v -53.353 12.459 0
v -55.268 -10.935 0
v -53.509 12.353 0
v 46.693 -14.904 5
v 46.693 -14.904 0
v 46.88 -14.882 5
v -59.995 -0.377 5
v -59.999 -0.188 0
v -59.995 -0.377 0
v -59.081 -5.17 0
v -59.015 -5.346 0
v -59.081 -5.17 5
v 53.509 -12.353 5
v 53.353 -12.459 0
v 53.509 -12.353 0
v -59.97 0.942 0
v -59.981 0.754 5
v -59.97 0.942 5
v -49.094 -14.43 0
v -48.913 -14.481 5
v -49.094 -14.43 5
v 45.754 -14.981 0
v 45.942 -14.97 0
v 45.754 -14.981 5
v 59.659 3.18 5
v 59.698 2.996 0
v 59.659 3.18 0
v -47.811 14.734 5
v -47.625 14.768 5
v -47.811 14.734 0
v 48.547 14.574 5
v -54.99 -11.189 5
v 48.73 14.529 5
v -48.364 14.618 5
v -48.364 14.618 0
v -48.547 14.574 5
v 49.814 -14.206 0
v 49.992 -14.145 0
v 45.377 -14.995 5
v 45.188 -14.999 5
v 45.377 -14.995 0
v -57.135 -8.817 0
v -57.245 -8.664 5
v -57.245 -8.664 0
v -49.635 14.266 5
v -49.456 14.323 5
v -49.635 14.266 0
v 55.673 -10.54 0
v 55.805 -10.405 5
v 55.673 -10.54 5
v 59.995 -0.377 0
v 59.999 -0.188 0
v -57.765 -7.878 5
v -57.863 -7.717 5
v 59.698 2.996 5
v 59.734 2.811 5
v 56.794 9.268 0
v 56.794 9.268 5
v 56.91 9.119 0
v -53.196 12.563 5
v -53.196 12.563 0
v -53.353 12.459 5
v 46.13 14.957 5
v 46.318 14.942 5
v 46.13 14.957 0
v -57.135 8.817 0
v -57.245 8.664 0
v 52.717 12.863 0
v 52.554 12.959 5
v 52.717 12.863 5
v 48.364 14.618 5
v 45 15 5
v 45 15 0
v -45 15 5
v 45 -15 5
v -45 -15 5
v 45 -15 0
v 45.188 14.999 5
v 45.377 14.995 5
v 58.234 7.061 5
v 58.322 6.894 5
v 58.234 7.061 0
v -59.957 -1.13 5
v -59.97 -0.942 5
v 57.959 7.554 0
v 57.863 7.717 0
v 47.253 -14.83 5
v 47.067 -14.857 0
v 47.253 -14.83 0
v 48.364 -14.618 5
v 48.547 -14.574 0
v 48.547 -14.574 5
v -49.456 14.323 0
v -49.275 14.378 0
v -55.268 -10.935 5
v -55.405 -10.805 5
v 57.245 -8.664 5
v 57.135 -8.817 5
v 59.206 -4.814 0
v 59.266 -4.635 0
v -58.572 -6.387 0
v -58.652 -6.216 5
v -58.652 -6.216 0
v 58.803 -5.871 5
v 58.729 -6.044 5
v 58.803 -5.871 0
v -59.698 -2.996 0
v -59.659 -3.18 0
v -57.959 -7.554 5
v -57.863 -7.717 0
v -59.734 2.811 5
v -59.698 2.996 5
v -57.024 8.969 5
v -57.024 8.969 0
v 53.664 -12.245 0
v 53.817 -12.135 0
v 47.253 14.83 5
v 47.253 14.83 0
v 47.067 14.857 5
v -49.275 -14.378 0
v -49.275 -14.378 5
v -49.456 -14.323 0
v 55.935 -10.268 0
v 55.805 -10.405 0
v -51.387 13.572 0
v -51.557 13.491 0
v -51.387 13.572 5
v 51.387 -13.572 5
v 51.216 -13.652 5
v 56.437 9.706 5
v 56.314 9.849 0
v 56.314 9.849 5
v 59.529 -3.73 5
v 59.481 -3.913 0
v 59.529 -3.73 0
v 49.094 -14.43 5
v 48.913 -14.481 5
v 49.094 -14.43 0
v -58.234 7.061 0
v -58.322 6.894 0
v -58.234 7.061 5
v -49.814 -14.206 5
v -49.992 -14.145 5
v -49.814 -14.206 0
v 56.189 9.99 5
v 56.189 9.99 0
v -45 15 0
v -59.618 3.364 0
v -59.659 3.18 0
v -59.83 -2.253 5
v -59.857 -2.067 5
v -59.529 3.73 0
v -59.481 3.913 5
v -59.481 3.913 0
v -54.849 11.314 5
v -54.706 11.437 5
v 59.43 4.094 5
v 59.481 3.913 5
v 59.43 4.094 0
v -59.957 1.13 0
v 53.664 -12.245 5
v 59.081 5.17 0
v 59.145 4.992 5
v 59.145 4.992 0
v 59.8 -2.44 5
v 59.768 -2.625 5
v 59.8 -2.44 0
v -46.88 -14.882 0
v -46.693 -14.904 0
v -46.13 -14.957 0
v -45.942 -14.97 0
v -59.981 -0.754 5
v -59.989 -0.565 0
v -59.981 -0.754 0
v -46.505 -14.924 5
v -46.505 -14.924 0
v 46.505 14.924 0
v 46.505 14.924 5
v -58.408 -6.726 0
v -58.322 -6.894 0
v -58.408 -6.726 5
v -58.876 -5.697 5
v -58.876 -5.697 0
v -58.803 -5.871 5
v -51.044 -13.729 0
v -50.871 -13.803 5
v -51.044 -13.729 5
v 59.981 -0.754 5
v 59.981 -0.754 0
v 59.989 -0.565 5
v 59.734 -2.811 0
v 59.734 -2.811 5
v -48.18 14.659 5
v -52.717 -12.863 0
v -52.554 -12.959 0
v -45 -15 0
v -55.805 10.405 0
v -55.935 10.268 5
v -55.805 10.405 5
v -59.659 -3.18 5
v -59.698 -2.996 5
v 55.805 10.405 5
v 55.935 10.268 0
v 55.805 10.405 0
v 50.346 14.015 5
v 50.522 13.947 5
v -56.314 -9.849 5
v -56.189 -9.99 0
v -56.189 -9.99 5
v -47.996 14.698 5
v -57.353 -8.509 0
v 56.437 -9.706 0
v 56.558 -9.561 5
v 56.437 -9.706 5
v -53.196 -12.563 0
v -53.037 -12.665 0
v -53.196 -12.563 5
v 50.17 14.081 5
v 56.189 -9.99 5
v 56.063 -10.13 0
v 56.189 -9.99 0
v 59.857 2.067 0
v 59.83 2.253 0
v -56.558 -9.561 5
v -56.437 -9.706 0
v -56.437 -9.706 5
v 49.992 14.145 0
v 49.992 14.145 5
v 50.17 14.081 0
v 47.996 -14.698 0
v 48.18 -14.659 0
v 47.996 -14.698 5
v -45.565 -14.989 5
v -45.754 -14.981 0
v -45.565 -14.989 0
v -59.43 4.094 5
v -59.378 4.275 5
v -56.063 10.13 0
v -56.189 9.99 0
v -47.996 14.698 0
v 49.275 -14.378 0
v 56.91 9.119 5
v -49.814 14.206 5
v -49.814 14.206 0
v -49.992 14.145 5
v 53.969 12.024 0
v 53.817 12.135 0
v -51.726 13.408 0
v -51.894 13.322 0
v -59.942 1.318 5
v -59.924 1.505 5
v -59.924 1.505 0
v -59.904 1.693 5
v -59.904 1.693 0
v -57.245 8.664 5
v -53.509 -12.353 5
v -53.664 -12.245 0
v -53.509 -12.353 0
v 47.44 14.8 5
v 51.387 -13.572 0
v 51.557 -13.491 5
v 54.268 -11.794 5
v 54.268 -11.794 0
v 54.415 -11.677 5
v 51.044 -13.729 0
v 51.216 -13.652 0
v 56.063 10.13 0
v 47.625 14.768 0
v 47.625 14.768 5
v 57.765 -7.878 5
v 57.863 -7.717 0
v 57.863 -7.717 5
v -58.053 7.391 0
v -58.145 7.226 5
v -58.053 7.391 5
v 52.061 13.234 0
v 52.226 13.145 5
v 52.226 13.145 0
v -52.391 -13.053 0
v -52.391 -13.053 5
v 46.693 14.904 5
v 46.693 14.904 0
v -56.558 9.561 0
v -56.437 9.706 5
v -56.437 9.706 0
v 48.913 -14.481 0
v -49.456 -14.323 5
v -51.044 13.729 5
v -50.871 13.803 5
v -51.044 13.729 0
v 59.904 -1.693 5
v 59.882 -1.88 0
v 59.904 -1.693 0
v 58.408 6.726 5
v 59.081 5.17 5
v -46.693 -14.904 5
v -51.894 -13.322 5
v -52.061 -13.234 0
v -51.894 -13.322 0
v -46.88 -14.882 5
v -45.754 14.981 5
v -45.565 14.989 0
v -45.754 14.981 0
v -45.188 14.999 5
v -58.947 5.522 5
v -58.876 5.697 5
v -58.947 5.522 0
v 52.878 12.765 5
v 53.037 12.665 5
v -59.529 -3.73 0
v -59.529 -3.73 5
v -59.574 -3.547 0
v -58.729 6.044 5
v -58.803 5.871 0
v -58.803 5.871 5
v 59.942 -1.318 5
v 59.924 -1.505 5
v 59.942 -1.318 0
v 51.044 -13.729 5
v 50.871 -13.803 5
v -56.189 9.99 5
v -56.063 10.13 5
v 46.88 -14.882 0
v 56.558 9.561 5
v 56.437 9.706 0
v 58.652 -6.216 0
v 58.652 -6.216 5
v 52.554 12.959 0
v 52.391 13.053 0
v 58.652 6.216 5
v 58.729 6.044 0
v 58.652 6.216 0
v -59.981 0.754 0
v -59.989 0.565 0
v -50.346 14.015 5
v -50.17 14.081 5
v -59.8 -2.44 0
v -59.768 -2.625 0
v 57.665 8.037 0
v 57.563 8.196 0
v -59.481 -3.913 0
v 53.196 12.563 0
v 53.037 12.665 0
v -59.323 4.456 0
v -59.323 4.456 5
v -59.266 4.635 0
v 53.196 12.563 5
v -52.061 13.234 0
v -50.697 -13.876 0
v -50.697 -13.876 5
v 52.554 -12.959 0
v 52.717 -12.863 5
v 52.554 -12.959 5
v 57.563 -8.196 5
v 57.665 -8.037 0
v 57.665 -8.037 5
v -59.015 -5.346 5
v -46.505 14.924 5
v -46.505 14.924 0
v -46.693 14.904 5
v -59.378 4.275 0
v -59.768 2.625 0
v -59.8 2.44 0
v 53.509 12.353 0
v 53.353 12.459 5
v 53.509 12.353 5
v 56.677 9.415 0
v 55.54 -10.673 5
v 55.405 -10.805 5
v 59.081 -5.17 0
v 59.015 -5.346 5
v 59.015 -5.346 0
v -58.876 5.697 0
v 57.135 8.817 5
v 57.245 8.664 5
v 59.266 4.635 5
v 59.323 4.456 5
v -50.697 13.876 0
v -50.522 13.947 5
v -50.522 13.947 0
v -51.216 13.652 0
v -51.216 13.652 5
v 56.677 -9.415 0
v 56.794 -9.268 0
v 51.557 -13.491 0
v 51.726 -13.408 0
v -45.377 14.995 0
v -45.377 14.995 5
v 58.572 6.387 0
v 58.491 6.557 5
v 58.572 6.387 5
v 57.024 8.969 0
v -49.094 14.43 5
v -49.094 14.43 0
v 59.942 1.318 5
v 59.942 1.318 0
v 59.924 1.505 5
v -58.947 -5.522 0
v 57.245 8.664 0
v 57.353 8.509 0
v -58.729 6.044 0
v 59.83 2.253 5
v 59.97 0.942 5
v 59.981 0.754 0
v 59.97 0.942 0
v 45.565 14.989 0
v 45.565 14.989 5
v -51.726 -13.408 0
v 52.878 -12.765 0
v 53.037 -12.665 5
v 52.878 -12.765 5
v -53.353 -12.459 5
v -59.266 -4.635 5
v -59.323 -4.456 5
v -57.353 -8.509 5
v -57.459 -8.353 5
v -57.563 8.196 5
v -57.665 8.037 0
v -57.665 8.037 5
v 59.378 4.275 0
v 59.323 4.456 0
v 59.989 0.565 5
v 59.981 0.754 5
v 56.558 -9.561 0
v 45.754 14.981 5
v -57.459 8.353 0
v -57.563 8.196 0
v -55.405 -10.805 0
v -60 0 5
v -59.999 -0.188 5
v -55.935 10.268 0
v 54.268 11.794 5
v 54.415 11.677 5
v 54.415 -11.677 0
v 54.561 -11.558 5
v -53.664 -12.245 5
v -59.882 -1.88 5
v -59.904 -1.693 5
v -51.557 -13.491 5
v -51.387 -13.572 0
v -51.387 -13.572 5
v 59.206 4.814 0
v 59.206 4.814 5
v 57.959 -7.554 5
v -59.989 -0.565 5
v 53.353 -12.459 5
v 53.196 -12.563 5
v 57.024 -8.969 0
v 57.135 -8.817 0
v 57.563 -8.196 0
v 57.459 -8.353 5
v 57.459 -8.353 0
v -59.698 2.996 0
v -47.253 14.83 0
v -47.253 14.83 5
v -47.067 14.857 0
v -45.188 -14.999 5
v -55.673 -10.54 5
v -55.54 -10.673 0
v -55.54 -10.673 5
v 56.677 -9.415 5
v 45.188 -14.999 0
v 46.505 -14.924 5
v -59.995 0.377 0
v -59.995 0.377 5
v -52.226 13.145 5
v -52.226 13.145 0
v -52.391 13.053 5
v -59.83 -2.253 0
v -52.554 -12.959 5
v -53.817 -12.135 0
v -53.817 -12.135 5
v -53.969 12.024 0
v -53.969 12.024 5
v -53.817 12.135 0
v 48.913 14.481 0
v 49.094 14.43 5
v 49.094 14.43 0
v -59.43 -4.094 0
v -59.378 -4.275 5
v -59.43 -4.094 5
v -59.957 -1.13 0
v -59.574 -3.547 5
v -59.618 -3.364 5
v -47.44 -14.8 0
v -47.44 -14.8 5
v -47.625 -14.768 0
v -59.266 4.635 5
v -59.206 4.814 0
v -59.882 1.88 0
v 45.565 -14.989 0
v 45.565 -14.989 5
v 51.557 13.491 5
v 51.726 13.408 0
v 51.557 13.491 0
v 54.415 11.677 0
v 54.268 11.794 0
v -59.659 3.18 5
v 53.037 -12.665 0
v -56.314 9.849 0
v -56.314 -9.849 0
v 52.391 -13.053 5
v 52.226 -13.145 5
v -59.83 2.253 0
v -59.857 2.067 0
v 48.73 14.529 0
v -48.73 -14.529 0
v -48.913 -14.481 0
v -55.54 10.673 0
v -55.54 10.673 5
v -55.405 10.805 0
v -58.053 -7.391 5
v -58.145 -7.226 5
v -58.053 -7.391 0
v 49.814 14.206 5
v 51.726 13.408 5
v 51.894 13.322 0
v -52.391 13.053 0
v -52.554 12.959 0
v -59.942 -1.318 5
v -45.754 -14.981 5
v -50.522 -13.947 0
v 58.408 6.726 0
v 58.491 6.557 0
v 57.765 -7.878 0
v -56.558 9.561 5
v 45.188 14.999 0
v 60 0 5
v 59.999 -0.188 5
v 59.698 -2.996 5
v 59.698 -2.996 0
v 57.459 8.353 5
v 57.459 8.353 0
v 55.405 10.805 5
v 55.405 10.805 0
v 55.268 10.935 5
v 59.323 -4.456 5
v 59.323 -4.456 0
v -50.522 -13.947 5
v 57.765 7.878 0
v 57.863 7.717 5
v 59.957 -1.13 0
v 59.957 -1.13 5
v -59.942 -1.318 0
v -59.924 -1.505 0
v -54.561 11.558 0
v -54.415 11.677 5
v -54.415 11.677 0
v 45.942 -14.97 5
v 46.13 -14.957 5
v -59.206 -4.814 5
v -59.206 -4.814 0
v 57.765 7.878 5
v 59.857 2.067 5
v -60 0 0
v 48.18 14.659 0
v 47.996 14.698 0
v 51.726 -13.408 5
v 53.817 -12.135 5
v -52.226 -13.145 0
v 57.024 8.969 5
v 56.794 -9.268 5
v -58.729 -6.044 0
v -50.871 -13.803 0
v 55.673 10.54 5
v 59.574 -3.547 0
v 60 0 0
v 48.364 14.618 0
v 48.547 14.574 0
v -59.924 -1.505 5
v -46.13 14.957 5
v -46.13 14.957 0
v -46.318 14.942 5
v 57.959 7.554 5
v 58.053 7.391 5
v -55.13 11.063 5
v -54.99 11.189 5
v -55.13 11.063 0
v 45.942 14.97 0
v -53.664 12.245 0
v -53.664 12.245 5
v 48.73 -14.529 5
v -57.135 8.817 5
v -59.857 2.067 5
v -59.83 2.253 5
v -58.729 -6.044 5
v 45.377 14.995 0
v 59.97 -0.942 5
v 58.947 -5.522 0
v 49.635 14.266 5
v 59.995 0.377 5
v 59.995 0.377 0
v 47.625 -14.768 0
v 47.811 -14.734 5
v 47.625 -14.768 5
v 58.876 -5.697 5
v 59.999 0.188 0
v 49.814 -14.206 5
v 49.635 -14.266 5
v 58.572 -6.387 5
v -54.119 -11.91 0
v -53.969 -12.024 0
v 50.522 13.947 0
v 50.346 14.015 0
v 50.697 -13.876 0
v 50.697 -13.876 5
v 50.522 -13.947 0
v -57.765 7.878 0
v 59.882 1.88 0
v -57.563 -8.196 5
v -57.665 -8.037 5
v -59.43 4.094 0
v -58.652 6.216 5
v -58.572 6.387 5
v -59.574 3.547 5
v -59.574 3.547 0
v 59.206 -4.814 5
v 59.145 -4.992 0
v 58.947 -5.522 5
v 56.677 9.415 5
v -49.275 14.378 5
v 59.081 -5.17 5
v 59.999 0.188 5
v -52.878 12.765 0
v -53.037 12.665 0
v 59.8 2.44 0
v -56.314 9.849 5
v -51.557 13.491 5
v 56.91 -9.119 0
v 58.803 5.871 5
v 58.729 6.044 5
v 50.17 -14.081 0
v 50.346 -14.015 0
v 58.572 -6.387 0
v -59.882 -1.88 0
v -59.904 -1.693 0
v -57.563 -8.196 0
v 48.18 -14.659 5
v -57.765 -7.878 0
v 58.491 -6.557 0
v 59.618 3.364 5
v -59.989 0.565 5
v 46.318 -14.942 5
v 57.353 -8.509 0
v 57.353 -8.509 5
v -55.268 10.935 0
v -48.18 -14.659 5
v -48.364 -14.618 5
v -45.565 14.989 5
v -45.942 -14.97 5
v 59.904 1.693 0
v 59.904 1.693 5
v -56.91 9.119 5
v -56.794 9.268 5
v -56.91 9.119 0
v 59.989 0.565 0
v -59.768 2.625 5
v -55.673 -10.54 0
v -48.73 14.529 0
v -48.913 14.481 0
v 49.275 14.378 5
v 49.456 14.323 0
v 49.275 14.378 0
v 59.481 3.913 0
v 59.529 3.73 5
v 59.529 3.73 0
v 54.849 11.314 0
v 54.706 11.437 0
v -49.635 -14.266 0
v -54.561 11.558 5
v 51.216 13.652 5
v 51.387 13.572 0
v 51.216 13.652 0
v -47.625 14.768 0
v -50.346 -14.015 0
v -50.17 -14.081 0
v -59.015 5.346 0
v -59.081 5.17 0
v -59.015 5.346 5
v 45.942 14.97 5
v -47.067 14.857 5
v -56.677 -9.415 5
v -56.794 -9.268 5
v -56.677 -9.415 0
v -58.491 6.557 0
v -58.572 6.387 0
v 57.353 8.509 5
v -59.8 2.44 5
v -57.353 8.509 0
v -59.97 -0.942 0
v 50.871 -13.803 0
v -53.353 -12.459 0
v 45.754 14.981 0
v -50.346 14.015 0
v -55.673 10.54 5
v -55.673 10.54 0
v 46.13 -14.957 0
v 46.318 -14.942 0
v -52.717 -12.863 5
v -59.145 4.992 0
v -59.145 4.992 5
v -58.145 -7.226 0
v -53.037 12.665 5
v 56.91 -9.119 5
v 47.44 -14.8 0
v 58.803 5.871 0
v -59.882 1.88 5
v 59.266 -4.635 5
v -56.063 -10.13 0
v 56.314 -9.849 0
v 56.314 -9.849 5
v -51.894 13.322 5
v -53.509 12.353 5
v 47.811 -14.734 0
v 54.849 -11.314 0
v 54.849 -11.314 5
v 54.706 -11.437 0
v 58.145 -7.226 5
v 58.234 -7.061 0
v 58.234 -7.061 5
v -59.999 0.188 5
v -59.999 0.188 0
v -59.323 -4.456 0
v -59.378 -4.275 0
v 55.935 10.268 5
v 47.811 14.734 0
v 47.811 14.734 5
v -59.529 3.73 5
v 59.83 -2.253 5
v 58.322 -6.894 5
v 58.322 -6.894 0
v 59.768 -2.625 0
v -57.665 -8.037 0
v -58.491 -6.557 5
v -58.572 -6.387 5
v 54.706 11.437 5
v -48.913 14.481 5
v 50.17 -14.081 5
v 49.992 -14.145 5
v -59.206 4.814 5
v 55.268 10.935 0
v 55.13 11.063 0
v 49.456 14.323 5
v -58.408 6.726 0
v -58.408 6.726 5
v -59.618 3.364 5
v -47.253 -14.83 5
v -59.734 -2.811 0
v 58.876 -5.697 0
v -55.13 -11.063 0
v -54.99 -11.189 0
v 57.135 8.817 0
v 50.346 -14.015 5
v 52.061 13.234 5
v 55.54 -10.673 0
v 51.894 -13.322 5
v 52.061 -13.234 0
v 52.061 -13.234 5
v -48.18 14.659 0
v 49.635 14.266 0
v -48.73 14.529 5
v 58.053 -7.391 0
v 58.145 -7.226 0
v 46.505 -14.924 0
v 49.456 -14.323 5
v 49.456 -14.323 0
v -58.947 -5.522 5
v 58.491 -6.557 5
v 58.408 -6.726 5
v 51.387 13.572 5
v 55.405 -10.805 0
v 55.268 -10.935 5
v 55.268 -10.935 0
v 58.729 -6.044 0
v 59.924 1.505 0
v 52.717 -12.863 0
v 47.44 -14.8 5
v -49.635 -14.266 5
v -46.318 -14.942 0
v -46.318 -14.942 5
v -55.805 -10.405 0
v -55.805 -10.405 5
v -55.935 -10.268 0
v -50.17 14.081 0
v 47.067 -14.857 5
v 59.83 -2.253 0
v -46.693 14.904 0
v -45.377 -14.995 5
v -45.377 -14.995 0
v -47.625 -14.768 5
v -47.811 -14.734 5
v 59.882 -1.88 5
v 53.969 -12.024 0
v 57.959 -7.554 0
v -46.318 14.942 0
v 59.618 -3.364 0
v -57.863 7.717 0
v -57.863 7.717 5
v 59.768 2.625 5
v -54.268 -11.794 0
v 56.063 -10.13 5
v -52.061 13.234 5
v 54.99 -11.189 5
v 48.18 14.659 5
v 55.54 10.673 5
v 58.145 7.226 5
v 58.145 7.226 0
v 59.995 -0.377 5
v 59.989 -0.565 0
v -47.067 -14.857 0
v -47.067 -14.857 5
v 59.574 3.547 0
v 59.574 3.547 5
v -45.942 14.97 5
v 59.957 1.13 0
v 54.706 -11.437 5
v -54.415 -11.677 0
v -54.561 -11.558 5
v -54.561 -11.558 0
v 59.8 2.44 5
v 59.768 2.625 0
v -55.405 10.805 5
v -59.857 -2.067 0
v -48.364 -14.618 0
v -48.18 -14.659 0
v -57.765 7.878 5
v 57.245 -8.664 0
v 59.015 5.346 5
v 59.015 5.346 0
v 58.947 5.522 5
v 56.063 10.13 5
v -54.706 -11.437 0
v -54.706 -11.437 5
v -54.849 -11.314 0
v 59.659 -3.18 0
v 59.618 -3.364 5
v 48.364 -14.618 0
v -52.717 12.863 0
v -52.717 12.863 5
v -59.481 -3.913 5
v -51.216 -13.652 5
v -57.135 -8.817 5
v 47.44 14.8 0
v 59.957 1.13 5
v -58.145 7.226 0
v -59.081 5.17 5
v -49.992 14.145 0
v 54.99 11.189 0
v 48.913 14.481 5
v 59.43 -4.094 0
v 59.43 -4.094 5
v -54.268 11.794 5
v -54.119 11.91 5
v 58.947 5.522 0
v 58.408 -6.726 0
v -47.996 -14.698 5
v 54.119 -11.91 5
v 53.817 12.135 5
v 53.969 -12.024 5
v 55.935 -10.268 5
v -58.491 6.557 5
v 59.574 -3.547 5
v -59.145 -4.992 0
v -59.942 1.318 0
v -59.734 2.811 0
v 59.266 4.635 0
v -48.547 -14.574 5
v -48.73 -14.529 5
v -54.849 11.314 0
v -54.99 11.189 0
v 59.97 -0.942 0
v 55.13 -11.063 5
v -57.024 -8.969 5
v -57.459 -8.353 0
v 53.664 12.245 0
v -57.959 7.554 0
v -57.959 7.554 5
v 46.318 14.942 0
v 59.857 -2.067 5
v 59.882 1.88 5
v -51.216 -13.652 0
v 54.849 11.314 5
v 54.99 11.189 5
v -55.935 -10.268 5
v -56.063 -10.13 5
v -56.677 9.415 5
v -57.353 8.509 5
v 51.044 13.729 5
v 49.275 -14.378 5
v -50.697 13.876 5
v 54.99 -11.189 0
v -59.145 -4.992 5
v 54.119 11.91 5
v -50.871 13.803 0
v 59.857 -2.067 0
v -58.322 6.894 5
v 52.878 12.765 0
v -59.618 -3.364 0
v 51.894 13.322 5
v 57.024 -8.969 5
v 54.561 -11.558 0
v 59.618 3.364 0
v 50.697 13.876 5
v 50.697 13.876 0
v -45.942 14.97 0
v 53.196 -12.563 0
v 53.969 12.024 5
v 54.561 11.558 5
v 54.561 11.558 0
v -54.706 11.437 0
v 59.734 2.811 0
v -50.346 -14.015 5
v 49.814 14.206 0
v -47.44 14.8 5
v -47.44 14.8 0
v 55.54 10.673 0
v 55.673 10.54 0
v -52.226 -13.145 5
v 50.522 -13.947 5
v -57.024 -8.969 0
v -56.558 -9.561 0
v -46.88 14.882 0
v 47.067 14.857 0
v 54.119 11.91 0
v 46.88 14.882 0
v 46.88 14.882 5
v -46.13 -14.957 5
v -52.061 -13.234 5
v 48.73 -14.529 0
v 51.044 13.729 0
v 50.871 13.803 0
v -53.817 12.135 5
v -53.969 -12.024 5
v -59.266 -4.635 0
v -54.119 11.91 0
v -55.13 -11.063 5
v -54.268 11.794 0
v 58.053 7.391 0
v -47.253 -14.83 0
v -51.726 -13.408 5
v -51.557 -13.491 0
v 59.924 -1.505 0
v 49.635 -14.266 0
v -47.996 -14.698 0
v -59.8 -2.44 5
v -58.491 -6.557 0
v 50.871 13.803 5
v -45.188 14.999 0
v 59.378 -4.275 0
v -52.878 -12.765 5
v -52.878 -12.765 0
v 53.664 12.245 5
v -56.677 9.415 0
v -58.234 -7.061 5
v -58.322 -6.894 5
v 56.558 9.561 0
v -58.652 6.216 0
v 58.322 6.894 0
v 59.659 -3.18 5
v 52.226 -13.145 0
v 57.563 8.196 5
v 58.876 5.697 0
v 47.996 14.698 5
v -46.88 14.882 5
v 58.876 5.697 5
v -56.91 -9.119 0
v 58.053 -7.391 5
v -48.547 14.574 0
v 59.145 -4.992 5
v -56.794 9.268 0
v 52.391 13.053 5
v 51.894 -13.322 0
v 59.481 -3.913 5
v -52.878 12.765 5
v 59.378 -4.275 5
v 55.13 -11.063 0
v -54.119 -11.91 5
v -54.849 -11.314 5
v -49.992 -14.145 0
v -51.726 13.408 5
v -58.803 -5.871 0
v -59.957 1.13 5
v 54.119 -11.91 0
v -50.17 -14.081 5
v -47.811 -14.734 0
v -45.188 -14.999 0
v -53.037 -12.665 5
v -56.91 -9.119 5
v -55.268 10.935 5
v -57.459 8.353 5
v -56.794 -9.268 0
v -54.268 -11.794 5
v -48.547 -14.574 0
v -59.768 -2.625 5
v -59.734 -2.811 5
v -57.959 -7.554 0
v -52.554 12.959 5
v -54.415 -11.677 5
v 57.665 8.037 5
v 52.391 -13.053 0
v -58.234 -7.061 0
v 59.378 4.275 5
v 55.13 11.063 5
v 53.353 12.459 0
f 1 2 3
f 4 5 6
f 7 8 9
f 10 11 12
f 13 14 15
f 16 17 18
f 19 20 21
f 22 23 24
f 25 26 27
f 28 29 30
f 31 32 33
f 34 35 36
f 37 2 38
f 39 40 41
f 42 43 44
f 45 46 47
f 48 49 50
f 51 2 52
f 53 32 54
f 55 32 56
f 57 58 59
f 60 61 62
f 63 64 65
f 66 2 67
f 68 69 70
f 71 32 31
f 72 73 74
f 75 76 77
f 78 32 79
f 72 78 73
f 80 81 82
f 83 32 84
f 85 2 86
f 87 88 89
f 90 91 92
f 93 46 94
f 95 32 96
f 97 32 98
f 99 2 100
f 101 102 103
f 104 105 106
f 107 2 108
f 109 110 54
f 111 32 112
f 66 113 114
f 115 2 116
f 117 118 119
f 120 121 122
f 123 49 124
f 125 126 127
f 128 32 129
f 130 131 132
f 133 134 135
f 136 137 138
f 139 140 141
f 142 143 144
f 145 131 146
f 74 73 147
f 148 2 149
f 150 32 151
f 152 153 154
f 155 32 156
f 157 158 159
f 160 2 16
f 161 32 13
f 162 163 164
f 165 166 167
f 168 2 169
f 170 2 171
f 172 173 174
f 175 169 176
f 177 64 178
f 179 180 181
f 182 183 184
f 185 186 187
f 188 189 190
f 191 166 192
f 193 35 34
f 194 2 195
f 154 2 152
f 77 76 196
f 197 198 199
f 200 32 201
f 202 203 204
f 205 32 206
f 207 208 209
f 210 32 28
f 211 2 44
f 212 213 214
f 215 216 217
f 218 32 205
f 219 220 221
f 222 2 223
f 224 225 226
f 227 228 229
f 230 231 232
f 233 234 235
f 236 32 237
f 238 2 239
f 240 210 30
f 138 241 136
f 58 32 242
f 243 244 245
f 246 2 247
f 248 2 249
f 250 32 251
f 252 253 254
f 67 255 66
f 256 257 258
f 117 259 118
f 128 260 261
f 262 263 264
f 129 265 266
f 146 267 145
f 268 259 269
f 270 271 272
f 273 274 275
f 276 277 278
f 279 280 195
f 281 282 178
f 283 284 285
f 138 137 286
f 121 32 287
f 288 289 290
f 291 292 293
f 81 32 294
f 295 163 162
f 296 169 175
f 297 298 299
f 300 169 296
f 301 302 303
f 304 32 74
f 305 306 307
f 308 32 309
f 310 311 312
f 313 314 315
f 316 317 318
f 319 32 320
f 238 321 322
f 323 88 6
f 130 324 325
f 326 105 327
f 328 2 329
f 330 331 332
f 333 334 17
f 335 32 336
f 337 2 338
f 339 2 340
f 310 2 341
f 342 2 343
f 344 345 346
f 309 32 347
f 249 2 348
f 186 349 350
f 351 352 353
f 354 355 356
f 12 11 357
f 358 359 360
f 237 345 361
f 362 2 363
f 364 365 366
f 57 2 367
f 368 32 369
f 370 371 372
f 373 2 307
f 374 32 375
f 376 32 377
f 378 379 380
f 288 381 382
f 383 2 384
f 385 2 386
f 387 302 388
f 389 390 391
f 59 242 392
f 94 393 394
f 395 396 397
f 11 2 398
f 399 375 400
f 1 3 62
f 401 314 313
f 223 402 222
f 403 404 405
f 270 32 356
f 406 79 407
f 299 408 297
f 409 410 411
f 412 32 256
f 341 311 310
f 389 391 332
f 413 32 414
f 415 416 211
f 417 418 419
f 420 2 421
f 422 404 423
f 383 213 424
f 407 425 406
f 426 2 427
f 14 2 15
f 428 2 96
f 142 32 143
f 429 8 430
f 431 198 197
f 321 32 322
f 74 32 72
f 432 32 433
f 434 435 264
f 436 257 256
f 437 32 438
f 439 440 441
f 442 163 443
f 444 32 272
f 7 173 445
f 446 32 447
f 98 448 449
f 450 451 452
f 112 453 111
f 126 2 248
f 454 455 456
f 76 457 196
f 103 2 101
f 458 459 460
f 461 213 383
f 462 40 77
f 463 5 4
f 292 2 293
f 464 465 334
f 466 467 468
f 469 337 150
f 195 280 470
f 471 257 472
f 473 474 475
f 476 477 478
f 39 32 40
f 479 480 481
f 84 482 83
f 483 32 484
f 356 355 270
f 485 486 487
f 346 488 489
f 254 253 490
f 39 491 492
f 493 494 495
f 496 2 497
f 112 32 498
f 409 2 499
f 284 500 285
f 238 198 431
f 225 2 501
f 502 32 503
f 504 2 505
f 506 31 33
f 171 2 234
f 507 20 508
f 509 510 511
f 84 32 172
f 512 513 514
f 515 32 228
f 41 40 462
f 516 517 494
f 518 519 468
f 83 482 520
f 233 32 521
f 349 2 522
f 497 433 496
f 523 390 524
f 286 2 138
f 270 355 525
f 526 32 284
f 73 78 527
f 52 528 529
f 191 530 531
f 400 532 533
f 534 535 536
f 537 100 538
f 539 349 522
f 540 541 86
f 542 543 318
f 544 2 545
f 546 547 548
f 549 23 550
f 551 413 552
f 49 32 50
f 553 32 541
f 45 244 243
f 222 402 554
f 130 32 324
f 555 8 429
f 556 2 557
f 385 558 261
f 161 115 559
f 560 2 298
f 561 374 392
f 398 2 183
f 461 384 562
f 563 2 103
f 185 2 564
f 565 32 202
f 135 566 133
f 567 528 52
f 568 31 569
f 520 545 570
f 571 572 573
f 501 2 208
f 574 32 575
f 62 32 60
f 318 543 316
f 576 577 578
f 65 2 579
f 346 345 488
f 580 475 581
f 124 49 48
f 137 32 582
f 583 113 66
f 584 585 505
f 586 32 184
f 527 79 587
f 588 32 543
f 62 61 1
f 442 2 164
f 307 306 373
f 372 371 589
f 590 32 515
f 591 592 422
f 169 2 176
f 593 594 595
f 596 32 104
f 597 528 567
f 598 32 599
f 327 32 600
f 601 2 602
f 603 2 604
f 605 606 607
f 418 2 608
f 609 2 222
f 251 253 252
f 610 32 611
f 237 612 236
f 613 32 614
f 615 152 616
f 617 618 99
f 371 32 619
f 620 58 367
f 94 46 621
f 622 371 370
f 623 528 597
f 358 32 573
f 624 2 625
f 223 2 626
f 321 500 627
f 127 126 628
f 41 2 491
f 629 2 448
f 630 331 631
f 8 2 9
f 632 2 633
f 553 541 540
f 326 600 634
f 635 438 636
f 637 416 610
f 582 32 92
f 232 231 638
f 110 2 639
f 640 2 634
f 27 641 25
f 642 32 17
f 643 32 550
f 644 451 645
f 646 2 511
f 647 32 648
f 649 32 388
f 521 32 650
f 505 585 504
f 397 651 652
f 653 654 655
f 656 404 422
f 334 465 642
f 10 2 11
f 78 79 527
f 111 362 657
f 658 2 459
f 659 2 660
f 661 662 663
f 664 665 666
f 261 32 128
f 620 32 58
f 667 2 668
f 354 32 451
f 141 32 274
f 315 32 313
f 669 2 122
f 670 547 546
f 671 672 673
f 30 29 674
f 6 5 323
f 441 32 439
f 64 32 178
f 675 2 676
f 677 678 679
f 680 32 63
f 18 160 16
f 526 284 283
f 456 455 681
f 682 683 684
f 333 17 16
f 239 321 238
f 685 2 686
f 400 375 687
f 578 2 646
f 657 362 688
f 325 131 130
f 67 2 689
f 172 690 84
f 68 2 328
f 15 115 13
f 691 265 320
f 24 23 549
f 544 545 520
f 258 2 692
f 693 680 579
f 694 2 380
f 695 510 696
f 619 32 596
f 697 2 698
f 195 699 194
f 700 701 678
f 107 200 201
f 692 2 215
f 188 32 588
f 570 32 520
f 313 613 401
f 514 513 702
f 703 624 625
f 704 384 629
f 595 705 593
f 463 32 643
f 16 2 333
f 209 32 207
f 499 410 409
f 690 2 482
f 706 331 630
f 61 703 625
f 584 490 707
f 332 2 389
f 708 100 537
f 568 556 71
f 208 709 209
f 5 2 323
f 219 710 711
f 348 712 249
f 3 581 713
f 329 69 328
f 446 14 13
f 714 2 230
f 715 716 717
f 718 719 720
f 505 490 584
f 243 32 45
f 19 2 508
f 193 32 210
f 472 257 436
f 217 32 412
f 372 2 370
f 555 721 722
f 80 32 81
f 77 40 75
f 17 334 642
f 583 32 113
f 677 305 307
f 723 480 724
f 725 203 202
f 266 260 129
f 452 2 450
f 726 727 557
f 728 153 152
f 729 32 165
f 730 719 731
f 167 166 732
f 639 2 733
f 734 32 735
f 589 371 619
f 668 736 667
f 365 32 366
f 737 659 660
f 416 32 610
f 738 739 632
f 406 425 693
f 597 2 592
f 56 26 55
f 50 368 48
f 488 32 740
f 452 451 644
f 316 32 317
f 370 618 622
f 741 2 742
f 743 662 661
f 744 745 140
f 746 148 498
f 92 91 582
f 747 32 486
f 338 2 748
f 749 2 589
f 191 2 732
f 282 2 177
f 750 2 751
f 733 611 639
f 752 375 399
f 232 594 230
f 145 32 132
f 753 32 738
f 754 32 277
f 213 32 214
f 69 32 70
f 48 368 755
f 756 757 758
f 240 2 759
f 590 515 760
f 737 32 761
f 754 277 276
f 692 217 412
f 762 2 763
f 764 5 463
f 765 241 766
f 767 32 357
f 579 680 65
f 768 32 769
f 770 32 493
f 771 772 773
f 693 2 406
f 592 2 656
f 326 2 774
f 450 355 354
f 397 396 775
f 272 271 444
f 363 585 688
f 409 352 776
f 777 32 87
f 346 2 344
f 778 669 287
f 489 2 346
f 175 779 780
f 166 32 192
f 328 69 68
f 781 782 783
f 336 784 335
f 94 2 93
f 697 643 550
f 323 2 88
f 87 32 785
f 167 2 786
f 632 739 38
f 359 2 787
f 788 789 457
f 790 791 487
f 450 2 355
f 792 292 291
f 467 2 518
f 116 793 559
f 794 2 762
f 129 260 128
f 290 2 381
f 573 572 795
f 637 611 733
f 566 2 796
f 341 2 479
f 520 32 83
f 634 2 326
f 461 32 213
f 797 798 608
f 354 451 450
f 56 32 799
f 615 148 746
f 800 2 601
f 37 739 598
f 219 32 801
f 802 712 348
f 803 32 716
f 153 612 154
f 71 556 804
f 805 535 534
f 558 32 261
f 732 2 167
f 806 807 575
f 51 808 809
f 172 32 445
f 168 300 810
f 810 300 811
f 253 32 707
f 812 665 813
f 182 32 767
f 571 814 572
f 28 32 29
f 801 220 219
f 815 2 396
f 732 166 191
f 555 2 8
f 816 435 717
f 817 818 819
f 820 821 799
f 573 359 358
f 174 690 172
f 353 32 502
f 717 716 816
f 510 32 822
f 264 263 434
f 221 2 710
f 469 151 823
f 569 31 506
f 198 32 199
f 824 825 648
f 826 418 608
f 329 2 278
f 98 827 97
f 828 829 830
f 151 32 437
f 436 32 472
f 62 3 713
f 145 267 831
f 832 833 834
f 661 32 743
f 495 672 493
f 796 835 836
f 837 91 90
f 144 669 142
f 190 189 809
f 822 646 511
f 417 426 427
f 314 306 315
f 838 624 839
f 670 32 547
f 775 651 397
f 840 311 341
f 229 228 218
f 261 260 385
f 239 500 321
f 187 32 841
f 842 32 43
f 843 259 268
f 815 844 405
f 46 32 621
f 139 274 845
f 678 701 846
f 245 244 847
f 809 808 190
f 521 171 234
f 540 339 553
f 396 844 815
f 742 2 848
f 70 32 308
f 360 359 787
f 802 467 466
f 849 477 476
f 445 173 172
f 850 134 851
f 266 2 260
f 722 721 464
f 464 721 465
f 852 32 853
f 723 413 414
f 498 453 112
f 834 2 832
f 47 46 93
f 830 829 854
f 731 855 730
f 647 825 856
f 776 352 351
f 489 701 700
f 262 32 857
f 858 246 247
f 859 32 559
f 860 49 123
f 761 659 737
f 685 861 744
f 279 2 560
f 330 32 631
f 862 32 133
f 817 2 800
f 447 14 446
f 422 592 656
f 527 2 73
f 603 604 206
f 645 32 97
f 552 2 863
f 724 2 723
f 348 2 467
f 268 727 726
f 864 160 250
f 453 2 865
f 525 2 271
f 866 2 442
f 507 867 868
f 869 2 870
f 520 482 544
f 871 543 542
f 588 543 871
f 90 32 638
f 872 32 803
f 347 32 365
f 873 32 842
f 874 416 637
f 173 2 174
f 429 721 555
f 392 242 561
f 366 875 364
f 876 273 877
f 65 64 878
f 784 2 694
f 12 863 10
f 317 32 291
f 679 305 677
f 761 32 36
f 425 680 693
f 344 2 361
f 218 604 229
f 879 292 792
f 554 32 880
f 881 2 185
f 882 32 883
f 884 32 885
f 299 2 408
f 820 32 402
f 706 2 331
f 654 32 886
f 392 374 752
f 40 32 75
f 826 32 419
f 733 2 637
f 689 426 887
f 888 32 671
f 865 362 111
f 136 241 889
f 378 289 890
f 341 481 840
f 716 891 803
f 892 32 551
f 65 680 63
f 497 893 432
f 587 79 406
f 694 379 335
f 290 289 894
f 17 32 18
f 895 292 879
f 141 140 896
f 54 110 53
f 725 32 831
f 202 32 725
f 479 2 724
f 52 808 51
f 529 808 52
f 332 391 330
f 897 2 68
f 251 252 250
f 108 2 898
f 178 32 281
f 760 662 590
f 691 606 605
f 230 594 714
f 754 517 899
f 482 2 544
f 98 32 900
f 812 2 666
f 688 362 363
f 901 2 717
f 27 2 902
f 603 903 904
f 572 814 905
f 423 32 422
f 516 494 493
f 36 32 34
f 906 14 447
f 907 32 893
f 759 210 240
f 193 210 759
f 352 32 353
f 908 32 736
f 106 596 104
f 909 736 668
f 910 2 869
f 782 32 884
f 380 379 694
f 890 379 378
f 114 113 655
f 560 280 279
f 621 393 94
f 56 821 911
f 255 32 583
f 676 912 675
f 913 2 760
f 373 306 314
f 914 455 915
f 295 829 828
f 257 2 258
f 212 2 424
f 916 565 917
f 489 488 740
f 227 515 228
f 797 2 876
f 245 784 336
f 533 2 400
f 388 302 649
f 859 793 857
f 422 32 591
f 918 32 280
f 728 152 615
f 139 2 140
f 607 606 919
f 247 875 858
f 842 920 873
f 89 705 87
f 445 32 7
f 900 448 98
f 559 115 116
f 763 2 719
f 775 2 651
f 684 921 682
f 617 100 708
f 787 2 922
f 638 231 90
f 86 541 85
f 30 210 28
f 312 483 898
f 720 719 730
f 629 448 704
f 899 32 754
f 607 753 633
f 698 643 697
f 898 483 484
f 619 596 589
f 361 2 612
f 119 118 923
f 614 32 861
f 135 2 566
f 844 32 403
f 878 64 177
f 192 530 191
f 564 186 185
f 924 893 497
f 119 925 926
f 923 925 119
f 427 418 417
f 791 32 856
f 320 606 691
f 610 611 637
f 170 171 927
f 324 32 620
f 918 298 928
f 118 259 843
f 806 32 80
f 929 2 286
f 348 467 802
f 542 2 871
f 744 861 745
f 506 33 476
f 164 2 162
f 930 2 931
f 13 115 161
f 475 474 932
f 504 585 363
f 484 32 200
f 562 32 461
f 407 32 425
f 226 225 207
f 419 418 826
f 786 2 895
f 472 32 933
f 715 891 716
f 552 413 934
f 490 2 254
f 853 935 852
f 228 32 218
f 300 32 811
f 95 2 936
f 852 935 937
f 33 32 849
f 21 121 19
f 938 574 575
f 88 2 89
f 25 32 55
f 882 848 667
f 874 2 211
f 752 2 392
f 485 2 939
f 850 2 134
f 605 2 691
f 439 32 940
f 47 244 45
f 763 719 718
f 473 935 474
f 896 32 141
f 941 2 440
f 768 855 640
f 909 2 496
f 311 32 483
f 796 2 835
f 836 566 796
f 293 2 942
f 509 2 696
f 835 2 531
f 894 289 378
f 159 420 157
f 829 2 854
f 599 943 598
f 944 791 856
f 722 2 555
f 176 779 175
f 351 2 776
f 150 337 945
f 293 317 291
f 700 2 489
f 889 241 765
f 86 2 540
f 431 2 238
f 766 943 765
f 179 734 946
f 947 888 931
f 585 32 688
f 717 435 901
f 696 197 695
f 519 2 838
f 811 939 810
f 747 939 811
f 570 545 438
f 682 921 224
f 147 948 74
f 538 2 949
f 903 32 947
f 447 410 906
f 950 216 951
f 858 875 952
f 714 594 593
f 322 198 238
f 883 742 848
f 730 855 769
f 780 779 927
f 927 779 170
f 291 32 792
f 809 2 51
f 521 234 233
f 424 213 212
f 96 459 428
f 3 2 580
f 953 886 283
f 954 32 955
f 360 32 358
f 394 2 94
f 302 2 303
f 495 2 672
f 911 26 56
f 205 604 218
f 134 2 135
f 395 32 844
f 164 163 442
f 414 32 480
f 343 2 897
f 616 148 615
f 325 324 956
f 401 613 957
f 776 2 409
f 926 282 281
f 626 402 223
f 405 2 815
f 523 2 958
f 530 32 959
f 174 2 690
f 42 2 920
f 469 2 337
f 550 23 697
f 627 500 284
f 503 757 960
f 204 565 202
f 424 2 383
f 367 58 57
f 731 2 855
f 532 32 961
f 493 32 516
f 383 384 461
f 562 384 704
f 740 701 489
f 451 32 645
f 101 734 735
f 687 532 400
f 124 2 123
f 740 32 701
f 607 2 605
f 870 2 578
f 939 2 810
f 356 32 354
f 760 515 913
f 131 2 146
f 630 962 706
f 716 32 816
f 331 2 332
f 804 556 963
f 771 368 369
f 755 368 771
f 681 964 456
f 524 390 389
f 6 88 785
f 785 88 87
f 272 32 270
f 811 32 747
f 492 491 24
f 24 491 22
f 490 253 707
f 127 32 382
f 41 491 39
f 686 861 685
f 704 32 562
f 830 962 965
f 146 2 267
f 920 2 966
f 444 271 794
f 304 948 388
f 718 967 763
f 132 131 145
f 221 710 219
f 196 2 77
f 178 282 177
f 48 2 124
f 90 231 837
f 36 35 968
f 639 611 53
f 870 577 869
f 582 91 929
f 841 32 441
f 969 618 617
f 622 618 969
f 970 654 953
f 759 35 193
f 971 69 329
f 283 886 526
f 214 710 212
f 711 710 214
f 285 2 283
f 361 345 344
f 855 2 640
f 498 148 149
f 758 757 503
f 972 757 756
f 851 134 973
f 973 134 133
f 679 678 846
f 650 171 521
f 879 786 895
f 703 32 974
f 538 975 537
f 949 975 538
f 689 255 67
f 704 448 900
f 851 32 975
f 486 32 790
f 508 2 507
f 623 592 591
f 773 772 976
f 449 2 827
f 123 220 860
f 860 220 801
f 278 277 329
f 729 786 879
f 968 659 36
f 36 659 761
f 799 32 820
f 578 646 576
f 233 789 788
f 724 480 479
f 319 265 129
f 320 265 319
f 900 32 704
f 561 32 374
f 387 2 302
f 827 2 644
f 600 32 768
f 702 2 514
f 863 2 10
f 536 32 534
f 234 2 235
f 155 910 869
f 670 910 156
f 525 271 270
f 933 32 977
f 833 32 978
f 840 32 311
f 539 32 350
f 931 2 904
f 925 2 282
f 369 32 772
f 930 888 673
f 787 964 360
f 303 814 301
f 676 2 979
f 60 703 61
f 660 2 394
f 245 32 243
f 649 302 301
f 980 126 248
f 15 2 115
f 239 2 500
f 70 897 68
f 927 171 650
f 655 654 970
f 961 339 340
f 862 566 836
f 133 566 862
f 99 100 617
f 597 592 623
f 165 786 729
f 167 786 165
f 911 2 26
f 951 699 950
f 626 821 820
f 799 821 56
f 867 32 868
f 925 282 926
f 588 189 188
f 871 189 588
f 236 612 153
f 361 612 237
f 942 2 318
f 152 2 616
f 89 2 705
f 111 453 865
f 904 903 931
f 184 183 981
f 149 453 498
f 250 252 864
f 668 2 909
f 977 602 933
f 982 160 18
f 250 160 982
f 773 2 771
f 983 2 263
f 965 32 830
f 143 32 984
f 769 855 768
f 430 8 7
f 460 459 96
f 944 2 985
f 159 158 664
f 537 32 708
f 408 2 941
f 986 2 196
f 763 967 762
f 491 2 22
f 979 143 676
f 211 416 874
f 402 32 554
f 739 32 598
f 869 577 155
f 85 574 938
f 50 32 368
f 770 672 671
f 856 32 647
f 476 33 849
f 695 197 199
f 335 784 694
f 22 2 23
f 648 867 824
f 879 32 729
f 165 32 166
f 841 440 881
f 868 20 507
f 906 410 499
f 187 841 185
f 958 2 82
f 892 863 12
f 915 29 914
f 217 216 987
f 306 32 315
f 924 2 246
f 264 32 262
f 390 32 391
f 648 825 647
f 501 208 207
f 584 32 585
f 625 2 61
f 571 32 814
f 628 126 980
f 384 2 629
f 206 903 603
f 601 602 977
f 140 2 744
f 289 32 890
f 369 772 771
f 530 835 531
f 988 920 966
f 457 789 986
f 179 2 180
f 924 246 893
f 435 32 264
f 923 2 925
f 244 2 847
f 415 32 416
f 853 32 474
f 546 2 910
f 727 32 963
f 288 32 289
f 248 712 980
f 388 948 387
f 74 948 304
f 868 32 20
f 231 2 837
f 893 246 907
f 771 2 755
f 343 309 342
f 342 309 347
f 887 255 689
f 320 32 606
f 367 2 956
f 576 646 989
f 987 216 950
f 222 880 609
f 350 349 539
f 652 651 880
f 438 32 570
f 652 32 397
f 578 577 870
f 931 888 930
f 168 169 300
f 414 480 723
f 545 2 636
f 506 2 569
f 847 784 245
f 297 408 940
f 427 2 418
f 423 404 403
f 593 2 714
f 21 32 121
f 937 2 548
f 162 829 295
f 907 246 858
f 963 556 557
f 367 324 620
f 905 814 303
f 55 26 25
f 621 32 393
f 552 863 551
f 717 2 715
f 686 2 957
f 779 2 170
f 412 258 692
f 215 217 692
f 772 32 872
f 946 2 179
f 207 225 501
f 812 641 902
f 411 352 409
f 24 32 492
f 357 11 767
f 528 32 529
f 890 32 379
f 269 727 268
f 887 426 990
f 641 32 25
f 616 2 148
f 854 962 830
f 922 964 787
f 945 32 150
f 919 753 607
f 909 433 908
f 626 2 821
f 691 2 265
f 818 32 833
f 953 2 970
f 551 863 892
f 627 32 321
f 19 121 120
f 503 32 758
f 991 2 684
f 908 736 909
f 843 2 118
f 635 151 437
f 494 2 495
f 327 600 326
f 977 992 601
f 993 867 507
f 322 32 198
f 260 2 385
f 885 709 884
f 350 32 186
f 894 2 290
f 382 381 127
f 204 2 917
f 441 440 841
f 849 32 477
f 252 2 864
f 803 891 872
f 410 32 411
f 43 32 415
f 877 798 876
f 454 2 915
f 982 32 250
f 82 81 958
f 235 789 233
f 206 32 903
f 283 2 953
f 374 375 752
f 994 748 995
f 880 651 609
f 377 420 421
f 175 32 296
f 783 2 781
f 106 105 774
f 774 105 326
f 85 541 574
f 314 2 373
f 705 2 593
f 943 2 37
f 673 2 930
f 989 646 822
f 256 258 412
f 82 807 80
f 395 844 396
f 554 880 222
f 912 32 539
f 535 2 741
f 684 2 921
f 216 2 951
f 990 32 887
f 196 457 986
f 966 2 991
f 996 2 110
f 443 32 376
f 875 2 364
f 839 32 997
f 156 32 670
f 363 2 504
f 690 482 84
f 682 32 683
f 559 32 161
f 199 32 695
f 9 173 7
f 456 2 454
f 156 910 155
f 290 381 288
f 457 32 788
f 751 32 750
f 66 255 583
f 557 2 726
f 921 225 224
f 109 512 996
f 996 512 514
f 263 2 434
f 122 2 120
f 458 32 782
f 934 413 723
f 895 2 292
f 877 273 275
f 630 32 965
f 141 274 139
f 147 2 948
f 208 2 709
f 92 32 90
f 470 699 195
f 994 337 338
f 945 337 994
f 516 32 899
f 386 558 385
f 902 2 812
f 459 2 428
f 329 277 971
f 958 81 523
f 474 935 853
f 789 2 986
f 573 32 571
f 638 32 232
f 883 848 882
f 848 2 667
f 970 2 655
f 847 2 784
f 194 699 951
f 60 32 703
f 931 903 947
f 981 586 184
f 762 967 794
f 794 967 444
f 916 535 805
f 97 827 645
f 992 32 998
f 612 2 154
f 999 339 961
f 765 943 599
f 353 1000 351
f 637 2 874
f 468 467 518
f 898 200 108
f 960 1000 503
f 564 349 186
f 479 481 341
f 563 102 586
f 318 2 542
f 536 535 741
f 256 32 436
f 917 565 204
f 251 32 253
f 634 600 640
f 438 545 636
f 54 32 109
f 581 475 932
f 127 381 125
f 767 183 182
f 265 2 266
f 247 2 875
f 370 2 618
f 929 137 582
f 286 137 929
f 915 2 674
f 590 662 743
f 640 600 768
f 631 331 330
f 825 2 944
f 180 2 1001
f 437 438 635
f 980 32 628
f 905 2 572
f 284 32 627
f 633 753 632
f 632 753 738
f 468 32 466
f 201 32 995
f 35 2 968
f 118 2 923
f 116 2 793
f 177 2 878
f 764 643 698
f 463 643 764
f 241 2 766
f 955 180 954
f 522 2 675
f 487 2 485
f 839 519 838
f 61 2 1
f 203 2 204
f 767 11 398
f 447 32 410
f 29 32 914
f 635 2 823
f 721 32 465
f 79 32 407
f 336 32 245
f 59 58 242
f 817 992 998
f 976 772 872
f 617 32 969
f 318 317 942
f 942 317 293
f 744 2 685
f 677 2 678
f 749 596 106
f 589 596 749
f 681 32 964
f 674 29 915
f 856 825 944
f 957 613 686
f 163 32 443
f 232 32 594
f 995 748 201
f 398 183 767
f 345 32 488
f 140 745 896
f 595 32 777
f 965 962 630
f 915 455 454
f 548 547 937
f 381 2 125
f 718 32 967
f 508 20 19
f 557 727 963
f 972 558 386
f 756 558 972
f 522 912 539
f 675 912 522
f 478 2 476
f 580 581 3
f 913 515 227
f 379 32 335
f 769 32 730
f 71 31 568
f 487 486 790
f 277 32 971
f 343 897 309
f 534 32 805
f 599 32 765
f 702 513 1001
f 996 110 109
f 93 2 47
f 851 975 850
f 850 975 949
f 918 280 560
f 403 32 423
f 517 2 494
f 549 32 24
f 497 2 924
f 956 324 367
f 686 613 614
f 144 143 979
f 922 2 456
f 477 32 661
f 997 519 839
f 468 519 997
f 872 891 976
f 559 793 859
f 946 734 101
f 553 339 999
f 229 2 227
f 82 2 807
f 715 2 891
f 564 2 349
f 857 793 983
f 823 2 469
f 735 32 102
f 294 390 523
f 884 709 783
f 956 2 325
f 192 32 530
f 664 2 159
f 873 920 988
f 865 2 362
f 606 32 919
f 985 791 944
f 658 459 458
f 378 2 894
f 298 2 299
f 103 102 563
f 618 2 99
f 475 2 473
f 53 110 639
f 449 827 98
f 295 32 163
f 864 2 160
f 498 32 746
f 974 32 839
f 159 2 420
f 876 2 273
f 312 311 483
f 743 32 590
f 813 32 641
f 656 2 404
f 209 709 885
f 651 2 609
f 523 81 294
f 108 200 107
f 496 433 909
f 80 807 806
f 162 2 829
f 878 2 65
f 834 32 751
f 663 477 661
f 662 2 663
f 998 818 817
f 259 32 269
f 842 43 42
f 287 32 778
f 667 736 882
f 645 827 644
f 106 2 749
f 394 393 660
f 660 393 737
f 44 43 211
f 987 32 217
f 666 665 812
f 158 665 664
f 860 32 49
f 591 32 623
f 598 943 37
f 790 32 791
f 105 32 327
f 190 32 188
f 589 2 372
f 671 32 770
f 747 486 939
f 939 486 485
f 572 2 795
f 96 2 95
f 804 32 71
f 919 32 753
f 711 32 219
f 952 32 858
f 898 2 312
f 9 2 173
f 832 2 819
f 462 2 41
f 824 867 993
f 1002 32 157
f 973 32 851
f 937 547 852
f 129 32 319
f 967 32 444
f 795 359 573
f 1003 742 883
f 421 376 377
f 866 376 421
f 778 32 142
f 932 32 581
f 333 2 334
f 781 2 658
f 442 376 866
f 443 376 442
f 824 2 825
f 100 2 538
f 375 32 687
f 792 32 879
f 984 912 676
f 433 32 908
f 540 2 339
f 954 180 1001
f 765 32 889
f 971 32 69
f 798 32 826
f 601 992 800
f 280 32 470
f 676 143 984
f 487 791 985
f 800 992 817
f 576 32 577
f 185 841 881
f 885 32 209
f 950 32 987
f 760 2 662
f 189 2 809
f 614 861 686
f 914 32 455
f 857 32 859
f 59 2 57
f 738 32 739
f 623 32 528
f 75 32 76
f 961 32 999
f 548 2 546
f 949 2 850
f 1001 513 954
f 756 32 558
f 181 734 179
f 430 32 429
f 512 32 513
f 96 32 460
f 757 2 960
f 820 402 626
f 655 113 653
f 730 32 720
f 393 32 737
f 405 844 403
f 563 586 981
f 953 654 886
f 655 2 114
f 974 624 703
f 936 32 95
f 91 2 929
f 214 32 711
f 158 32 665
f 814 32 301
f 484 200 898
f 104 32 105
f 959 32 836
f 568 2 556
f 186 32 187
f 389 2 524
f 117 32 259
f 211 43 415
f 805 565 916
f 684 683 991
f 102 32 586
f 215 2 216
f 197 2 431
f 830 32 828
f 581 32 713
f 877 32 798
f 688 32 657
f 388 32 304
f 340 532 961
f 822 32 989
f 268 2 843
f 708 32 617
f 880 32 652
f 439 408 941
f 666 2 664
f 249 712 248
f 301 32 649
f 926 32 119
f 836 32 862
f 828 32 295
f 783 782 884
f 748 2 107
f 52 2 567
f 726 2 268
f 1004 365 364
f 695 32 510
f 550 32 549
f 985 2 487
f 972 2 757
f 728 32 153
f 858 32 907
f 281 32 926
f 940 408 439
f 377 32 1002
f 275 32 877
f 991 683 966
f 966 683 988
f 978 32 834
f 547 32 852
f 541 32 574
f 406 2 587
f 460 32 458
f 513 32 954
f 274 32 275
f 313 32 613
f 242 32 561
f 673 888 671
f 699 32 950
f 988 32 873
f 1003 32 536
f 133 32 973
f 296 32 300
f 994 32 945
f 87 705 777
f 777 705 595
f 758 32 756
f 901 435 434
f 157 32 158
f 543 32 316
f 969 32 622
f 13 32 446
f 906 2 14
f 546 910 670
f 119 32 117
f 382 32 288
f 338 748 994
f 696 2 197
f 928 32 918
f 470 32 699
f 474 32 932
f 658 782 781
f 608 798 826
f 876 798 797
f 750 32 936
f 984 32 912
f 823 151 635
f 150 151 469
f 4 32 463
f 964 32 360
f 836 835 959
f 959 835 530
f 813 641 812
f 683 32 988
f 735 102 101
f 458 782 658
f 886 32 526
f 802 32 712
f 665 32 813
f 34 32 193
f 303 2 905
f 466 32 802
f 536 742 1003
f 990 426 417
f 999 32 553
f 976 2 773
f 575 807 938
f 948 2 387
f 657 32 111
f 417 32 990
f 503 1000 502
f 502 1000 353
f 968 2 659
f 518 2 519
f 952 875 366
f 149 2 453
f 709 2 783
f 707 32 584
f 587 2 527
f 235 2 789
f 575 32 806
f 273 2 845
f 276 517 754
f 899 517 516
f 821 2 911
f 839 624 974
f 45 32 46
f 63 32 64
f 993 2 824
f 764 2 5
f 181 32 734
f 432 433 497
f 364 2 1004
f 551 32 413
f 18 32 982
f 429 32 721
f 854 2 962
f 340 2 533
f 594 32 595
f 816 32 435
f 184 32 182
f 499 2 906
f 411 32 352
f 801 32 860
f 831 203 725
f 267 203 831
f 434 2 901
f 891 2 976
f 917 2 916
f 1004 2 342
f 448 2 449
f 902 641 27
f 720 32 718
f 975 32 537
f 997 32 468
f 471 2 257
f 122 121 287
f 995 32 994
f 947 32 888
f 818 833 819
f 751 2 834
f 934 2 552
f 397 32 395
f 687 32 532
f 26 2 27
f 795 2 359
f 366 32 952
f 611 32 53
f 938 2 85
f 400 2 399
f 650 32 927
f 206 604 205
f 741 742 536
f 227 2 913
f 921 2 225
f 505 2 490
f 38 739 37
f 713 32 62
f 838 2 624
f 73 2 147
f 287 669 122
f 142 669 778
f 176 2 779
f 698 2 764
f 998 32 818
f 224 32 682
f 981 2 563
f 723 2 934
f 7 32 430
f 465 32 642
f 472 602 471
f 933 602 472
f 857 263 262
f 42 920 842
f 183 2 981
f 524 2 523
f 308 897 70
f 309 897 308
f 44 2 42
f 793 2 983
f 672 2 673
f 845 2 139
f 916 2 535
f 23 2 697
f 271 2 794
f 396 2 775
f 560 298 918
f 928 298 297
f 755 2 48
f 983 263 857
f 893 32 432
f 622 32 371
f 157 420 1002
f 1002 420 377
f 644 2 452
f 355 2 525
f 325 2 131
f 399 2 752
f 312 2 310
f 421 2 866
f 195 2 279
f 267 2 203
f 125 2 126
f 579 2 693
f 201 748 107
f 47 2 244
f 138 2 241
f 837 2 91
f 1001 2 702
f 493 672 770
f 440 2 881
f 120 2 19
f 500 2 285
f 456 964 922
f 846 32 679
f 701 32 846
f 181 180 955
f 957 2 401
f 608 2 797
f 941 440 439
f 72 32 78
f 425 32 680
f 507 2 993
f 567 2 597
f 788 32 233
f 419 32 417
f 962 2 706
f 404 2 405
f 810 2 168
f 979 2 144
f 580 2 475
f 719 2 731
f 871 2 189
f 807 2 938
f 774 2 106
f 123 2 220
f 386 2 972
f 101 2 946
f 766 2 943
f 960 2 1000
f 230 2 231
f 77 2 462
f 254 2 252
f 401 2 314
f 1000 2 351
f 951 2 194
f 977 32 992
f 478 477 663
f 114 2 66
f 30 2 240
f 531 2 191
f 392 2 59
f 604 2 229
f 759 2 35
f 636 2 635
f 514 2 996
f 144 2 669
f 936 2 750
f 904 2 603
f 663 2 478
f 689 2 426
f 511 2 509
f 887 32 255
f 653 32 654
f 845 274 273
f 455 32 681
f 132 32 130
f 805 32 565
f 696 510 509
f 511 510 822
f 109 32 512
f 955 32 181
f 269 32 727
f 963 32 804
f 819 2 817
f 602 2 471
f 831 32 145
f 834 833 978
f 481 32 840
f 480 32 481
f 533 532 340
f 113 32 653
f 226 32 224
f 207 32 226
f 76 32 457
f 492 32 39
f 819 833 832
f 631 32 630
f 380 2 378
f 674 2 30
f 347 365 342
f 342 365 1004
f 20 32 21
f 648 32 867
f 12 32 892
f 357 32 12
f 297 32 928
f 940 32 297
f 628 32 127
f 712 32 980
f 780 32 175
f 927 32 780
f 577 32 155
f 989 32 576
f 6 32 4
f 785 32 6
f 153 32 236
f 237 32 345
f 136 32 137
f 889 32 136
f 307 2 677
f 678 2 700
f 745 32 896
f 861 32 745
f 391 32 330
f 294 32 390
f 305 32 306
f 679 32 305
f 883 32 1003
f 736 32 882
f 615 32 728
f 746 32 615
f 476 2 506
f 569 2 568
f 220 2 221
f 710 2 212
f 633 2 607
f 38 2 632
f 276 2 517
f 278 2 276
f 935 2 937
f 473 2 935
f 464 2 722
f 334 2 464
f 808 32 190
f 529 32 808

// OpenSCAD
CORNER_DIA = 30;
THICKNESS = 5;
WIDTH = 120;

$fn = 500;

hull() {
    translate([-(WIDTH-CORNER_DIA)/2, 0, 0])
    cylinder(d = CORNER_DIA, h = THICKNESS);
    translate([(WIDTH-CORNER_DIA)/2, 0, 0])
    cylinder(d = CORNER_DIA, h = THICKNESS);
}
